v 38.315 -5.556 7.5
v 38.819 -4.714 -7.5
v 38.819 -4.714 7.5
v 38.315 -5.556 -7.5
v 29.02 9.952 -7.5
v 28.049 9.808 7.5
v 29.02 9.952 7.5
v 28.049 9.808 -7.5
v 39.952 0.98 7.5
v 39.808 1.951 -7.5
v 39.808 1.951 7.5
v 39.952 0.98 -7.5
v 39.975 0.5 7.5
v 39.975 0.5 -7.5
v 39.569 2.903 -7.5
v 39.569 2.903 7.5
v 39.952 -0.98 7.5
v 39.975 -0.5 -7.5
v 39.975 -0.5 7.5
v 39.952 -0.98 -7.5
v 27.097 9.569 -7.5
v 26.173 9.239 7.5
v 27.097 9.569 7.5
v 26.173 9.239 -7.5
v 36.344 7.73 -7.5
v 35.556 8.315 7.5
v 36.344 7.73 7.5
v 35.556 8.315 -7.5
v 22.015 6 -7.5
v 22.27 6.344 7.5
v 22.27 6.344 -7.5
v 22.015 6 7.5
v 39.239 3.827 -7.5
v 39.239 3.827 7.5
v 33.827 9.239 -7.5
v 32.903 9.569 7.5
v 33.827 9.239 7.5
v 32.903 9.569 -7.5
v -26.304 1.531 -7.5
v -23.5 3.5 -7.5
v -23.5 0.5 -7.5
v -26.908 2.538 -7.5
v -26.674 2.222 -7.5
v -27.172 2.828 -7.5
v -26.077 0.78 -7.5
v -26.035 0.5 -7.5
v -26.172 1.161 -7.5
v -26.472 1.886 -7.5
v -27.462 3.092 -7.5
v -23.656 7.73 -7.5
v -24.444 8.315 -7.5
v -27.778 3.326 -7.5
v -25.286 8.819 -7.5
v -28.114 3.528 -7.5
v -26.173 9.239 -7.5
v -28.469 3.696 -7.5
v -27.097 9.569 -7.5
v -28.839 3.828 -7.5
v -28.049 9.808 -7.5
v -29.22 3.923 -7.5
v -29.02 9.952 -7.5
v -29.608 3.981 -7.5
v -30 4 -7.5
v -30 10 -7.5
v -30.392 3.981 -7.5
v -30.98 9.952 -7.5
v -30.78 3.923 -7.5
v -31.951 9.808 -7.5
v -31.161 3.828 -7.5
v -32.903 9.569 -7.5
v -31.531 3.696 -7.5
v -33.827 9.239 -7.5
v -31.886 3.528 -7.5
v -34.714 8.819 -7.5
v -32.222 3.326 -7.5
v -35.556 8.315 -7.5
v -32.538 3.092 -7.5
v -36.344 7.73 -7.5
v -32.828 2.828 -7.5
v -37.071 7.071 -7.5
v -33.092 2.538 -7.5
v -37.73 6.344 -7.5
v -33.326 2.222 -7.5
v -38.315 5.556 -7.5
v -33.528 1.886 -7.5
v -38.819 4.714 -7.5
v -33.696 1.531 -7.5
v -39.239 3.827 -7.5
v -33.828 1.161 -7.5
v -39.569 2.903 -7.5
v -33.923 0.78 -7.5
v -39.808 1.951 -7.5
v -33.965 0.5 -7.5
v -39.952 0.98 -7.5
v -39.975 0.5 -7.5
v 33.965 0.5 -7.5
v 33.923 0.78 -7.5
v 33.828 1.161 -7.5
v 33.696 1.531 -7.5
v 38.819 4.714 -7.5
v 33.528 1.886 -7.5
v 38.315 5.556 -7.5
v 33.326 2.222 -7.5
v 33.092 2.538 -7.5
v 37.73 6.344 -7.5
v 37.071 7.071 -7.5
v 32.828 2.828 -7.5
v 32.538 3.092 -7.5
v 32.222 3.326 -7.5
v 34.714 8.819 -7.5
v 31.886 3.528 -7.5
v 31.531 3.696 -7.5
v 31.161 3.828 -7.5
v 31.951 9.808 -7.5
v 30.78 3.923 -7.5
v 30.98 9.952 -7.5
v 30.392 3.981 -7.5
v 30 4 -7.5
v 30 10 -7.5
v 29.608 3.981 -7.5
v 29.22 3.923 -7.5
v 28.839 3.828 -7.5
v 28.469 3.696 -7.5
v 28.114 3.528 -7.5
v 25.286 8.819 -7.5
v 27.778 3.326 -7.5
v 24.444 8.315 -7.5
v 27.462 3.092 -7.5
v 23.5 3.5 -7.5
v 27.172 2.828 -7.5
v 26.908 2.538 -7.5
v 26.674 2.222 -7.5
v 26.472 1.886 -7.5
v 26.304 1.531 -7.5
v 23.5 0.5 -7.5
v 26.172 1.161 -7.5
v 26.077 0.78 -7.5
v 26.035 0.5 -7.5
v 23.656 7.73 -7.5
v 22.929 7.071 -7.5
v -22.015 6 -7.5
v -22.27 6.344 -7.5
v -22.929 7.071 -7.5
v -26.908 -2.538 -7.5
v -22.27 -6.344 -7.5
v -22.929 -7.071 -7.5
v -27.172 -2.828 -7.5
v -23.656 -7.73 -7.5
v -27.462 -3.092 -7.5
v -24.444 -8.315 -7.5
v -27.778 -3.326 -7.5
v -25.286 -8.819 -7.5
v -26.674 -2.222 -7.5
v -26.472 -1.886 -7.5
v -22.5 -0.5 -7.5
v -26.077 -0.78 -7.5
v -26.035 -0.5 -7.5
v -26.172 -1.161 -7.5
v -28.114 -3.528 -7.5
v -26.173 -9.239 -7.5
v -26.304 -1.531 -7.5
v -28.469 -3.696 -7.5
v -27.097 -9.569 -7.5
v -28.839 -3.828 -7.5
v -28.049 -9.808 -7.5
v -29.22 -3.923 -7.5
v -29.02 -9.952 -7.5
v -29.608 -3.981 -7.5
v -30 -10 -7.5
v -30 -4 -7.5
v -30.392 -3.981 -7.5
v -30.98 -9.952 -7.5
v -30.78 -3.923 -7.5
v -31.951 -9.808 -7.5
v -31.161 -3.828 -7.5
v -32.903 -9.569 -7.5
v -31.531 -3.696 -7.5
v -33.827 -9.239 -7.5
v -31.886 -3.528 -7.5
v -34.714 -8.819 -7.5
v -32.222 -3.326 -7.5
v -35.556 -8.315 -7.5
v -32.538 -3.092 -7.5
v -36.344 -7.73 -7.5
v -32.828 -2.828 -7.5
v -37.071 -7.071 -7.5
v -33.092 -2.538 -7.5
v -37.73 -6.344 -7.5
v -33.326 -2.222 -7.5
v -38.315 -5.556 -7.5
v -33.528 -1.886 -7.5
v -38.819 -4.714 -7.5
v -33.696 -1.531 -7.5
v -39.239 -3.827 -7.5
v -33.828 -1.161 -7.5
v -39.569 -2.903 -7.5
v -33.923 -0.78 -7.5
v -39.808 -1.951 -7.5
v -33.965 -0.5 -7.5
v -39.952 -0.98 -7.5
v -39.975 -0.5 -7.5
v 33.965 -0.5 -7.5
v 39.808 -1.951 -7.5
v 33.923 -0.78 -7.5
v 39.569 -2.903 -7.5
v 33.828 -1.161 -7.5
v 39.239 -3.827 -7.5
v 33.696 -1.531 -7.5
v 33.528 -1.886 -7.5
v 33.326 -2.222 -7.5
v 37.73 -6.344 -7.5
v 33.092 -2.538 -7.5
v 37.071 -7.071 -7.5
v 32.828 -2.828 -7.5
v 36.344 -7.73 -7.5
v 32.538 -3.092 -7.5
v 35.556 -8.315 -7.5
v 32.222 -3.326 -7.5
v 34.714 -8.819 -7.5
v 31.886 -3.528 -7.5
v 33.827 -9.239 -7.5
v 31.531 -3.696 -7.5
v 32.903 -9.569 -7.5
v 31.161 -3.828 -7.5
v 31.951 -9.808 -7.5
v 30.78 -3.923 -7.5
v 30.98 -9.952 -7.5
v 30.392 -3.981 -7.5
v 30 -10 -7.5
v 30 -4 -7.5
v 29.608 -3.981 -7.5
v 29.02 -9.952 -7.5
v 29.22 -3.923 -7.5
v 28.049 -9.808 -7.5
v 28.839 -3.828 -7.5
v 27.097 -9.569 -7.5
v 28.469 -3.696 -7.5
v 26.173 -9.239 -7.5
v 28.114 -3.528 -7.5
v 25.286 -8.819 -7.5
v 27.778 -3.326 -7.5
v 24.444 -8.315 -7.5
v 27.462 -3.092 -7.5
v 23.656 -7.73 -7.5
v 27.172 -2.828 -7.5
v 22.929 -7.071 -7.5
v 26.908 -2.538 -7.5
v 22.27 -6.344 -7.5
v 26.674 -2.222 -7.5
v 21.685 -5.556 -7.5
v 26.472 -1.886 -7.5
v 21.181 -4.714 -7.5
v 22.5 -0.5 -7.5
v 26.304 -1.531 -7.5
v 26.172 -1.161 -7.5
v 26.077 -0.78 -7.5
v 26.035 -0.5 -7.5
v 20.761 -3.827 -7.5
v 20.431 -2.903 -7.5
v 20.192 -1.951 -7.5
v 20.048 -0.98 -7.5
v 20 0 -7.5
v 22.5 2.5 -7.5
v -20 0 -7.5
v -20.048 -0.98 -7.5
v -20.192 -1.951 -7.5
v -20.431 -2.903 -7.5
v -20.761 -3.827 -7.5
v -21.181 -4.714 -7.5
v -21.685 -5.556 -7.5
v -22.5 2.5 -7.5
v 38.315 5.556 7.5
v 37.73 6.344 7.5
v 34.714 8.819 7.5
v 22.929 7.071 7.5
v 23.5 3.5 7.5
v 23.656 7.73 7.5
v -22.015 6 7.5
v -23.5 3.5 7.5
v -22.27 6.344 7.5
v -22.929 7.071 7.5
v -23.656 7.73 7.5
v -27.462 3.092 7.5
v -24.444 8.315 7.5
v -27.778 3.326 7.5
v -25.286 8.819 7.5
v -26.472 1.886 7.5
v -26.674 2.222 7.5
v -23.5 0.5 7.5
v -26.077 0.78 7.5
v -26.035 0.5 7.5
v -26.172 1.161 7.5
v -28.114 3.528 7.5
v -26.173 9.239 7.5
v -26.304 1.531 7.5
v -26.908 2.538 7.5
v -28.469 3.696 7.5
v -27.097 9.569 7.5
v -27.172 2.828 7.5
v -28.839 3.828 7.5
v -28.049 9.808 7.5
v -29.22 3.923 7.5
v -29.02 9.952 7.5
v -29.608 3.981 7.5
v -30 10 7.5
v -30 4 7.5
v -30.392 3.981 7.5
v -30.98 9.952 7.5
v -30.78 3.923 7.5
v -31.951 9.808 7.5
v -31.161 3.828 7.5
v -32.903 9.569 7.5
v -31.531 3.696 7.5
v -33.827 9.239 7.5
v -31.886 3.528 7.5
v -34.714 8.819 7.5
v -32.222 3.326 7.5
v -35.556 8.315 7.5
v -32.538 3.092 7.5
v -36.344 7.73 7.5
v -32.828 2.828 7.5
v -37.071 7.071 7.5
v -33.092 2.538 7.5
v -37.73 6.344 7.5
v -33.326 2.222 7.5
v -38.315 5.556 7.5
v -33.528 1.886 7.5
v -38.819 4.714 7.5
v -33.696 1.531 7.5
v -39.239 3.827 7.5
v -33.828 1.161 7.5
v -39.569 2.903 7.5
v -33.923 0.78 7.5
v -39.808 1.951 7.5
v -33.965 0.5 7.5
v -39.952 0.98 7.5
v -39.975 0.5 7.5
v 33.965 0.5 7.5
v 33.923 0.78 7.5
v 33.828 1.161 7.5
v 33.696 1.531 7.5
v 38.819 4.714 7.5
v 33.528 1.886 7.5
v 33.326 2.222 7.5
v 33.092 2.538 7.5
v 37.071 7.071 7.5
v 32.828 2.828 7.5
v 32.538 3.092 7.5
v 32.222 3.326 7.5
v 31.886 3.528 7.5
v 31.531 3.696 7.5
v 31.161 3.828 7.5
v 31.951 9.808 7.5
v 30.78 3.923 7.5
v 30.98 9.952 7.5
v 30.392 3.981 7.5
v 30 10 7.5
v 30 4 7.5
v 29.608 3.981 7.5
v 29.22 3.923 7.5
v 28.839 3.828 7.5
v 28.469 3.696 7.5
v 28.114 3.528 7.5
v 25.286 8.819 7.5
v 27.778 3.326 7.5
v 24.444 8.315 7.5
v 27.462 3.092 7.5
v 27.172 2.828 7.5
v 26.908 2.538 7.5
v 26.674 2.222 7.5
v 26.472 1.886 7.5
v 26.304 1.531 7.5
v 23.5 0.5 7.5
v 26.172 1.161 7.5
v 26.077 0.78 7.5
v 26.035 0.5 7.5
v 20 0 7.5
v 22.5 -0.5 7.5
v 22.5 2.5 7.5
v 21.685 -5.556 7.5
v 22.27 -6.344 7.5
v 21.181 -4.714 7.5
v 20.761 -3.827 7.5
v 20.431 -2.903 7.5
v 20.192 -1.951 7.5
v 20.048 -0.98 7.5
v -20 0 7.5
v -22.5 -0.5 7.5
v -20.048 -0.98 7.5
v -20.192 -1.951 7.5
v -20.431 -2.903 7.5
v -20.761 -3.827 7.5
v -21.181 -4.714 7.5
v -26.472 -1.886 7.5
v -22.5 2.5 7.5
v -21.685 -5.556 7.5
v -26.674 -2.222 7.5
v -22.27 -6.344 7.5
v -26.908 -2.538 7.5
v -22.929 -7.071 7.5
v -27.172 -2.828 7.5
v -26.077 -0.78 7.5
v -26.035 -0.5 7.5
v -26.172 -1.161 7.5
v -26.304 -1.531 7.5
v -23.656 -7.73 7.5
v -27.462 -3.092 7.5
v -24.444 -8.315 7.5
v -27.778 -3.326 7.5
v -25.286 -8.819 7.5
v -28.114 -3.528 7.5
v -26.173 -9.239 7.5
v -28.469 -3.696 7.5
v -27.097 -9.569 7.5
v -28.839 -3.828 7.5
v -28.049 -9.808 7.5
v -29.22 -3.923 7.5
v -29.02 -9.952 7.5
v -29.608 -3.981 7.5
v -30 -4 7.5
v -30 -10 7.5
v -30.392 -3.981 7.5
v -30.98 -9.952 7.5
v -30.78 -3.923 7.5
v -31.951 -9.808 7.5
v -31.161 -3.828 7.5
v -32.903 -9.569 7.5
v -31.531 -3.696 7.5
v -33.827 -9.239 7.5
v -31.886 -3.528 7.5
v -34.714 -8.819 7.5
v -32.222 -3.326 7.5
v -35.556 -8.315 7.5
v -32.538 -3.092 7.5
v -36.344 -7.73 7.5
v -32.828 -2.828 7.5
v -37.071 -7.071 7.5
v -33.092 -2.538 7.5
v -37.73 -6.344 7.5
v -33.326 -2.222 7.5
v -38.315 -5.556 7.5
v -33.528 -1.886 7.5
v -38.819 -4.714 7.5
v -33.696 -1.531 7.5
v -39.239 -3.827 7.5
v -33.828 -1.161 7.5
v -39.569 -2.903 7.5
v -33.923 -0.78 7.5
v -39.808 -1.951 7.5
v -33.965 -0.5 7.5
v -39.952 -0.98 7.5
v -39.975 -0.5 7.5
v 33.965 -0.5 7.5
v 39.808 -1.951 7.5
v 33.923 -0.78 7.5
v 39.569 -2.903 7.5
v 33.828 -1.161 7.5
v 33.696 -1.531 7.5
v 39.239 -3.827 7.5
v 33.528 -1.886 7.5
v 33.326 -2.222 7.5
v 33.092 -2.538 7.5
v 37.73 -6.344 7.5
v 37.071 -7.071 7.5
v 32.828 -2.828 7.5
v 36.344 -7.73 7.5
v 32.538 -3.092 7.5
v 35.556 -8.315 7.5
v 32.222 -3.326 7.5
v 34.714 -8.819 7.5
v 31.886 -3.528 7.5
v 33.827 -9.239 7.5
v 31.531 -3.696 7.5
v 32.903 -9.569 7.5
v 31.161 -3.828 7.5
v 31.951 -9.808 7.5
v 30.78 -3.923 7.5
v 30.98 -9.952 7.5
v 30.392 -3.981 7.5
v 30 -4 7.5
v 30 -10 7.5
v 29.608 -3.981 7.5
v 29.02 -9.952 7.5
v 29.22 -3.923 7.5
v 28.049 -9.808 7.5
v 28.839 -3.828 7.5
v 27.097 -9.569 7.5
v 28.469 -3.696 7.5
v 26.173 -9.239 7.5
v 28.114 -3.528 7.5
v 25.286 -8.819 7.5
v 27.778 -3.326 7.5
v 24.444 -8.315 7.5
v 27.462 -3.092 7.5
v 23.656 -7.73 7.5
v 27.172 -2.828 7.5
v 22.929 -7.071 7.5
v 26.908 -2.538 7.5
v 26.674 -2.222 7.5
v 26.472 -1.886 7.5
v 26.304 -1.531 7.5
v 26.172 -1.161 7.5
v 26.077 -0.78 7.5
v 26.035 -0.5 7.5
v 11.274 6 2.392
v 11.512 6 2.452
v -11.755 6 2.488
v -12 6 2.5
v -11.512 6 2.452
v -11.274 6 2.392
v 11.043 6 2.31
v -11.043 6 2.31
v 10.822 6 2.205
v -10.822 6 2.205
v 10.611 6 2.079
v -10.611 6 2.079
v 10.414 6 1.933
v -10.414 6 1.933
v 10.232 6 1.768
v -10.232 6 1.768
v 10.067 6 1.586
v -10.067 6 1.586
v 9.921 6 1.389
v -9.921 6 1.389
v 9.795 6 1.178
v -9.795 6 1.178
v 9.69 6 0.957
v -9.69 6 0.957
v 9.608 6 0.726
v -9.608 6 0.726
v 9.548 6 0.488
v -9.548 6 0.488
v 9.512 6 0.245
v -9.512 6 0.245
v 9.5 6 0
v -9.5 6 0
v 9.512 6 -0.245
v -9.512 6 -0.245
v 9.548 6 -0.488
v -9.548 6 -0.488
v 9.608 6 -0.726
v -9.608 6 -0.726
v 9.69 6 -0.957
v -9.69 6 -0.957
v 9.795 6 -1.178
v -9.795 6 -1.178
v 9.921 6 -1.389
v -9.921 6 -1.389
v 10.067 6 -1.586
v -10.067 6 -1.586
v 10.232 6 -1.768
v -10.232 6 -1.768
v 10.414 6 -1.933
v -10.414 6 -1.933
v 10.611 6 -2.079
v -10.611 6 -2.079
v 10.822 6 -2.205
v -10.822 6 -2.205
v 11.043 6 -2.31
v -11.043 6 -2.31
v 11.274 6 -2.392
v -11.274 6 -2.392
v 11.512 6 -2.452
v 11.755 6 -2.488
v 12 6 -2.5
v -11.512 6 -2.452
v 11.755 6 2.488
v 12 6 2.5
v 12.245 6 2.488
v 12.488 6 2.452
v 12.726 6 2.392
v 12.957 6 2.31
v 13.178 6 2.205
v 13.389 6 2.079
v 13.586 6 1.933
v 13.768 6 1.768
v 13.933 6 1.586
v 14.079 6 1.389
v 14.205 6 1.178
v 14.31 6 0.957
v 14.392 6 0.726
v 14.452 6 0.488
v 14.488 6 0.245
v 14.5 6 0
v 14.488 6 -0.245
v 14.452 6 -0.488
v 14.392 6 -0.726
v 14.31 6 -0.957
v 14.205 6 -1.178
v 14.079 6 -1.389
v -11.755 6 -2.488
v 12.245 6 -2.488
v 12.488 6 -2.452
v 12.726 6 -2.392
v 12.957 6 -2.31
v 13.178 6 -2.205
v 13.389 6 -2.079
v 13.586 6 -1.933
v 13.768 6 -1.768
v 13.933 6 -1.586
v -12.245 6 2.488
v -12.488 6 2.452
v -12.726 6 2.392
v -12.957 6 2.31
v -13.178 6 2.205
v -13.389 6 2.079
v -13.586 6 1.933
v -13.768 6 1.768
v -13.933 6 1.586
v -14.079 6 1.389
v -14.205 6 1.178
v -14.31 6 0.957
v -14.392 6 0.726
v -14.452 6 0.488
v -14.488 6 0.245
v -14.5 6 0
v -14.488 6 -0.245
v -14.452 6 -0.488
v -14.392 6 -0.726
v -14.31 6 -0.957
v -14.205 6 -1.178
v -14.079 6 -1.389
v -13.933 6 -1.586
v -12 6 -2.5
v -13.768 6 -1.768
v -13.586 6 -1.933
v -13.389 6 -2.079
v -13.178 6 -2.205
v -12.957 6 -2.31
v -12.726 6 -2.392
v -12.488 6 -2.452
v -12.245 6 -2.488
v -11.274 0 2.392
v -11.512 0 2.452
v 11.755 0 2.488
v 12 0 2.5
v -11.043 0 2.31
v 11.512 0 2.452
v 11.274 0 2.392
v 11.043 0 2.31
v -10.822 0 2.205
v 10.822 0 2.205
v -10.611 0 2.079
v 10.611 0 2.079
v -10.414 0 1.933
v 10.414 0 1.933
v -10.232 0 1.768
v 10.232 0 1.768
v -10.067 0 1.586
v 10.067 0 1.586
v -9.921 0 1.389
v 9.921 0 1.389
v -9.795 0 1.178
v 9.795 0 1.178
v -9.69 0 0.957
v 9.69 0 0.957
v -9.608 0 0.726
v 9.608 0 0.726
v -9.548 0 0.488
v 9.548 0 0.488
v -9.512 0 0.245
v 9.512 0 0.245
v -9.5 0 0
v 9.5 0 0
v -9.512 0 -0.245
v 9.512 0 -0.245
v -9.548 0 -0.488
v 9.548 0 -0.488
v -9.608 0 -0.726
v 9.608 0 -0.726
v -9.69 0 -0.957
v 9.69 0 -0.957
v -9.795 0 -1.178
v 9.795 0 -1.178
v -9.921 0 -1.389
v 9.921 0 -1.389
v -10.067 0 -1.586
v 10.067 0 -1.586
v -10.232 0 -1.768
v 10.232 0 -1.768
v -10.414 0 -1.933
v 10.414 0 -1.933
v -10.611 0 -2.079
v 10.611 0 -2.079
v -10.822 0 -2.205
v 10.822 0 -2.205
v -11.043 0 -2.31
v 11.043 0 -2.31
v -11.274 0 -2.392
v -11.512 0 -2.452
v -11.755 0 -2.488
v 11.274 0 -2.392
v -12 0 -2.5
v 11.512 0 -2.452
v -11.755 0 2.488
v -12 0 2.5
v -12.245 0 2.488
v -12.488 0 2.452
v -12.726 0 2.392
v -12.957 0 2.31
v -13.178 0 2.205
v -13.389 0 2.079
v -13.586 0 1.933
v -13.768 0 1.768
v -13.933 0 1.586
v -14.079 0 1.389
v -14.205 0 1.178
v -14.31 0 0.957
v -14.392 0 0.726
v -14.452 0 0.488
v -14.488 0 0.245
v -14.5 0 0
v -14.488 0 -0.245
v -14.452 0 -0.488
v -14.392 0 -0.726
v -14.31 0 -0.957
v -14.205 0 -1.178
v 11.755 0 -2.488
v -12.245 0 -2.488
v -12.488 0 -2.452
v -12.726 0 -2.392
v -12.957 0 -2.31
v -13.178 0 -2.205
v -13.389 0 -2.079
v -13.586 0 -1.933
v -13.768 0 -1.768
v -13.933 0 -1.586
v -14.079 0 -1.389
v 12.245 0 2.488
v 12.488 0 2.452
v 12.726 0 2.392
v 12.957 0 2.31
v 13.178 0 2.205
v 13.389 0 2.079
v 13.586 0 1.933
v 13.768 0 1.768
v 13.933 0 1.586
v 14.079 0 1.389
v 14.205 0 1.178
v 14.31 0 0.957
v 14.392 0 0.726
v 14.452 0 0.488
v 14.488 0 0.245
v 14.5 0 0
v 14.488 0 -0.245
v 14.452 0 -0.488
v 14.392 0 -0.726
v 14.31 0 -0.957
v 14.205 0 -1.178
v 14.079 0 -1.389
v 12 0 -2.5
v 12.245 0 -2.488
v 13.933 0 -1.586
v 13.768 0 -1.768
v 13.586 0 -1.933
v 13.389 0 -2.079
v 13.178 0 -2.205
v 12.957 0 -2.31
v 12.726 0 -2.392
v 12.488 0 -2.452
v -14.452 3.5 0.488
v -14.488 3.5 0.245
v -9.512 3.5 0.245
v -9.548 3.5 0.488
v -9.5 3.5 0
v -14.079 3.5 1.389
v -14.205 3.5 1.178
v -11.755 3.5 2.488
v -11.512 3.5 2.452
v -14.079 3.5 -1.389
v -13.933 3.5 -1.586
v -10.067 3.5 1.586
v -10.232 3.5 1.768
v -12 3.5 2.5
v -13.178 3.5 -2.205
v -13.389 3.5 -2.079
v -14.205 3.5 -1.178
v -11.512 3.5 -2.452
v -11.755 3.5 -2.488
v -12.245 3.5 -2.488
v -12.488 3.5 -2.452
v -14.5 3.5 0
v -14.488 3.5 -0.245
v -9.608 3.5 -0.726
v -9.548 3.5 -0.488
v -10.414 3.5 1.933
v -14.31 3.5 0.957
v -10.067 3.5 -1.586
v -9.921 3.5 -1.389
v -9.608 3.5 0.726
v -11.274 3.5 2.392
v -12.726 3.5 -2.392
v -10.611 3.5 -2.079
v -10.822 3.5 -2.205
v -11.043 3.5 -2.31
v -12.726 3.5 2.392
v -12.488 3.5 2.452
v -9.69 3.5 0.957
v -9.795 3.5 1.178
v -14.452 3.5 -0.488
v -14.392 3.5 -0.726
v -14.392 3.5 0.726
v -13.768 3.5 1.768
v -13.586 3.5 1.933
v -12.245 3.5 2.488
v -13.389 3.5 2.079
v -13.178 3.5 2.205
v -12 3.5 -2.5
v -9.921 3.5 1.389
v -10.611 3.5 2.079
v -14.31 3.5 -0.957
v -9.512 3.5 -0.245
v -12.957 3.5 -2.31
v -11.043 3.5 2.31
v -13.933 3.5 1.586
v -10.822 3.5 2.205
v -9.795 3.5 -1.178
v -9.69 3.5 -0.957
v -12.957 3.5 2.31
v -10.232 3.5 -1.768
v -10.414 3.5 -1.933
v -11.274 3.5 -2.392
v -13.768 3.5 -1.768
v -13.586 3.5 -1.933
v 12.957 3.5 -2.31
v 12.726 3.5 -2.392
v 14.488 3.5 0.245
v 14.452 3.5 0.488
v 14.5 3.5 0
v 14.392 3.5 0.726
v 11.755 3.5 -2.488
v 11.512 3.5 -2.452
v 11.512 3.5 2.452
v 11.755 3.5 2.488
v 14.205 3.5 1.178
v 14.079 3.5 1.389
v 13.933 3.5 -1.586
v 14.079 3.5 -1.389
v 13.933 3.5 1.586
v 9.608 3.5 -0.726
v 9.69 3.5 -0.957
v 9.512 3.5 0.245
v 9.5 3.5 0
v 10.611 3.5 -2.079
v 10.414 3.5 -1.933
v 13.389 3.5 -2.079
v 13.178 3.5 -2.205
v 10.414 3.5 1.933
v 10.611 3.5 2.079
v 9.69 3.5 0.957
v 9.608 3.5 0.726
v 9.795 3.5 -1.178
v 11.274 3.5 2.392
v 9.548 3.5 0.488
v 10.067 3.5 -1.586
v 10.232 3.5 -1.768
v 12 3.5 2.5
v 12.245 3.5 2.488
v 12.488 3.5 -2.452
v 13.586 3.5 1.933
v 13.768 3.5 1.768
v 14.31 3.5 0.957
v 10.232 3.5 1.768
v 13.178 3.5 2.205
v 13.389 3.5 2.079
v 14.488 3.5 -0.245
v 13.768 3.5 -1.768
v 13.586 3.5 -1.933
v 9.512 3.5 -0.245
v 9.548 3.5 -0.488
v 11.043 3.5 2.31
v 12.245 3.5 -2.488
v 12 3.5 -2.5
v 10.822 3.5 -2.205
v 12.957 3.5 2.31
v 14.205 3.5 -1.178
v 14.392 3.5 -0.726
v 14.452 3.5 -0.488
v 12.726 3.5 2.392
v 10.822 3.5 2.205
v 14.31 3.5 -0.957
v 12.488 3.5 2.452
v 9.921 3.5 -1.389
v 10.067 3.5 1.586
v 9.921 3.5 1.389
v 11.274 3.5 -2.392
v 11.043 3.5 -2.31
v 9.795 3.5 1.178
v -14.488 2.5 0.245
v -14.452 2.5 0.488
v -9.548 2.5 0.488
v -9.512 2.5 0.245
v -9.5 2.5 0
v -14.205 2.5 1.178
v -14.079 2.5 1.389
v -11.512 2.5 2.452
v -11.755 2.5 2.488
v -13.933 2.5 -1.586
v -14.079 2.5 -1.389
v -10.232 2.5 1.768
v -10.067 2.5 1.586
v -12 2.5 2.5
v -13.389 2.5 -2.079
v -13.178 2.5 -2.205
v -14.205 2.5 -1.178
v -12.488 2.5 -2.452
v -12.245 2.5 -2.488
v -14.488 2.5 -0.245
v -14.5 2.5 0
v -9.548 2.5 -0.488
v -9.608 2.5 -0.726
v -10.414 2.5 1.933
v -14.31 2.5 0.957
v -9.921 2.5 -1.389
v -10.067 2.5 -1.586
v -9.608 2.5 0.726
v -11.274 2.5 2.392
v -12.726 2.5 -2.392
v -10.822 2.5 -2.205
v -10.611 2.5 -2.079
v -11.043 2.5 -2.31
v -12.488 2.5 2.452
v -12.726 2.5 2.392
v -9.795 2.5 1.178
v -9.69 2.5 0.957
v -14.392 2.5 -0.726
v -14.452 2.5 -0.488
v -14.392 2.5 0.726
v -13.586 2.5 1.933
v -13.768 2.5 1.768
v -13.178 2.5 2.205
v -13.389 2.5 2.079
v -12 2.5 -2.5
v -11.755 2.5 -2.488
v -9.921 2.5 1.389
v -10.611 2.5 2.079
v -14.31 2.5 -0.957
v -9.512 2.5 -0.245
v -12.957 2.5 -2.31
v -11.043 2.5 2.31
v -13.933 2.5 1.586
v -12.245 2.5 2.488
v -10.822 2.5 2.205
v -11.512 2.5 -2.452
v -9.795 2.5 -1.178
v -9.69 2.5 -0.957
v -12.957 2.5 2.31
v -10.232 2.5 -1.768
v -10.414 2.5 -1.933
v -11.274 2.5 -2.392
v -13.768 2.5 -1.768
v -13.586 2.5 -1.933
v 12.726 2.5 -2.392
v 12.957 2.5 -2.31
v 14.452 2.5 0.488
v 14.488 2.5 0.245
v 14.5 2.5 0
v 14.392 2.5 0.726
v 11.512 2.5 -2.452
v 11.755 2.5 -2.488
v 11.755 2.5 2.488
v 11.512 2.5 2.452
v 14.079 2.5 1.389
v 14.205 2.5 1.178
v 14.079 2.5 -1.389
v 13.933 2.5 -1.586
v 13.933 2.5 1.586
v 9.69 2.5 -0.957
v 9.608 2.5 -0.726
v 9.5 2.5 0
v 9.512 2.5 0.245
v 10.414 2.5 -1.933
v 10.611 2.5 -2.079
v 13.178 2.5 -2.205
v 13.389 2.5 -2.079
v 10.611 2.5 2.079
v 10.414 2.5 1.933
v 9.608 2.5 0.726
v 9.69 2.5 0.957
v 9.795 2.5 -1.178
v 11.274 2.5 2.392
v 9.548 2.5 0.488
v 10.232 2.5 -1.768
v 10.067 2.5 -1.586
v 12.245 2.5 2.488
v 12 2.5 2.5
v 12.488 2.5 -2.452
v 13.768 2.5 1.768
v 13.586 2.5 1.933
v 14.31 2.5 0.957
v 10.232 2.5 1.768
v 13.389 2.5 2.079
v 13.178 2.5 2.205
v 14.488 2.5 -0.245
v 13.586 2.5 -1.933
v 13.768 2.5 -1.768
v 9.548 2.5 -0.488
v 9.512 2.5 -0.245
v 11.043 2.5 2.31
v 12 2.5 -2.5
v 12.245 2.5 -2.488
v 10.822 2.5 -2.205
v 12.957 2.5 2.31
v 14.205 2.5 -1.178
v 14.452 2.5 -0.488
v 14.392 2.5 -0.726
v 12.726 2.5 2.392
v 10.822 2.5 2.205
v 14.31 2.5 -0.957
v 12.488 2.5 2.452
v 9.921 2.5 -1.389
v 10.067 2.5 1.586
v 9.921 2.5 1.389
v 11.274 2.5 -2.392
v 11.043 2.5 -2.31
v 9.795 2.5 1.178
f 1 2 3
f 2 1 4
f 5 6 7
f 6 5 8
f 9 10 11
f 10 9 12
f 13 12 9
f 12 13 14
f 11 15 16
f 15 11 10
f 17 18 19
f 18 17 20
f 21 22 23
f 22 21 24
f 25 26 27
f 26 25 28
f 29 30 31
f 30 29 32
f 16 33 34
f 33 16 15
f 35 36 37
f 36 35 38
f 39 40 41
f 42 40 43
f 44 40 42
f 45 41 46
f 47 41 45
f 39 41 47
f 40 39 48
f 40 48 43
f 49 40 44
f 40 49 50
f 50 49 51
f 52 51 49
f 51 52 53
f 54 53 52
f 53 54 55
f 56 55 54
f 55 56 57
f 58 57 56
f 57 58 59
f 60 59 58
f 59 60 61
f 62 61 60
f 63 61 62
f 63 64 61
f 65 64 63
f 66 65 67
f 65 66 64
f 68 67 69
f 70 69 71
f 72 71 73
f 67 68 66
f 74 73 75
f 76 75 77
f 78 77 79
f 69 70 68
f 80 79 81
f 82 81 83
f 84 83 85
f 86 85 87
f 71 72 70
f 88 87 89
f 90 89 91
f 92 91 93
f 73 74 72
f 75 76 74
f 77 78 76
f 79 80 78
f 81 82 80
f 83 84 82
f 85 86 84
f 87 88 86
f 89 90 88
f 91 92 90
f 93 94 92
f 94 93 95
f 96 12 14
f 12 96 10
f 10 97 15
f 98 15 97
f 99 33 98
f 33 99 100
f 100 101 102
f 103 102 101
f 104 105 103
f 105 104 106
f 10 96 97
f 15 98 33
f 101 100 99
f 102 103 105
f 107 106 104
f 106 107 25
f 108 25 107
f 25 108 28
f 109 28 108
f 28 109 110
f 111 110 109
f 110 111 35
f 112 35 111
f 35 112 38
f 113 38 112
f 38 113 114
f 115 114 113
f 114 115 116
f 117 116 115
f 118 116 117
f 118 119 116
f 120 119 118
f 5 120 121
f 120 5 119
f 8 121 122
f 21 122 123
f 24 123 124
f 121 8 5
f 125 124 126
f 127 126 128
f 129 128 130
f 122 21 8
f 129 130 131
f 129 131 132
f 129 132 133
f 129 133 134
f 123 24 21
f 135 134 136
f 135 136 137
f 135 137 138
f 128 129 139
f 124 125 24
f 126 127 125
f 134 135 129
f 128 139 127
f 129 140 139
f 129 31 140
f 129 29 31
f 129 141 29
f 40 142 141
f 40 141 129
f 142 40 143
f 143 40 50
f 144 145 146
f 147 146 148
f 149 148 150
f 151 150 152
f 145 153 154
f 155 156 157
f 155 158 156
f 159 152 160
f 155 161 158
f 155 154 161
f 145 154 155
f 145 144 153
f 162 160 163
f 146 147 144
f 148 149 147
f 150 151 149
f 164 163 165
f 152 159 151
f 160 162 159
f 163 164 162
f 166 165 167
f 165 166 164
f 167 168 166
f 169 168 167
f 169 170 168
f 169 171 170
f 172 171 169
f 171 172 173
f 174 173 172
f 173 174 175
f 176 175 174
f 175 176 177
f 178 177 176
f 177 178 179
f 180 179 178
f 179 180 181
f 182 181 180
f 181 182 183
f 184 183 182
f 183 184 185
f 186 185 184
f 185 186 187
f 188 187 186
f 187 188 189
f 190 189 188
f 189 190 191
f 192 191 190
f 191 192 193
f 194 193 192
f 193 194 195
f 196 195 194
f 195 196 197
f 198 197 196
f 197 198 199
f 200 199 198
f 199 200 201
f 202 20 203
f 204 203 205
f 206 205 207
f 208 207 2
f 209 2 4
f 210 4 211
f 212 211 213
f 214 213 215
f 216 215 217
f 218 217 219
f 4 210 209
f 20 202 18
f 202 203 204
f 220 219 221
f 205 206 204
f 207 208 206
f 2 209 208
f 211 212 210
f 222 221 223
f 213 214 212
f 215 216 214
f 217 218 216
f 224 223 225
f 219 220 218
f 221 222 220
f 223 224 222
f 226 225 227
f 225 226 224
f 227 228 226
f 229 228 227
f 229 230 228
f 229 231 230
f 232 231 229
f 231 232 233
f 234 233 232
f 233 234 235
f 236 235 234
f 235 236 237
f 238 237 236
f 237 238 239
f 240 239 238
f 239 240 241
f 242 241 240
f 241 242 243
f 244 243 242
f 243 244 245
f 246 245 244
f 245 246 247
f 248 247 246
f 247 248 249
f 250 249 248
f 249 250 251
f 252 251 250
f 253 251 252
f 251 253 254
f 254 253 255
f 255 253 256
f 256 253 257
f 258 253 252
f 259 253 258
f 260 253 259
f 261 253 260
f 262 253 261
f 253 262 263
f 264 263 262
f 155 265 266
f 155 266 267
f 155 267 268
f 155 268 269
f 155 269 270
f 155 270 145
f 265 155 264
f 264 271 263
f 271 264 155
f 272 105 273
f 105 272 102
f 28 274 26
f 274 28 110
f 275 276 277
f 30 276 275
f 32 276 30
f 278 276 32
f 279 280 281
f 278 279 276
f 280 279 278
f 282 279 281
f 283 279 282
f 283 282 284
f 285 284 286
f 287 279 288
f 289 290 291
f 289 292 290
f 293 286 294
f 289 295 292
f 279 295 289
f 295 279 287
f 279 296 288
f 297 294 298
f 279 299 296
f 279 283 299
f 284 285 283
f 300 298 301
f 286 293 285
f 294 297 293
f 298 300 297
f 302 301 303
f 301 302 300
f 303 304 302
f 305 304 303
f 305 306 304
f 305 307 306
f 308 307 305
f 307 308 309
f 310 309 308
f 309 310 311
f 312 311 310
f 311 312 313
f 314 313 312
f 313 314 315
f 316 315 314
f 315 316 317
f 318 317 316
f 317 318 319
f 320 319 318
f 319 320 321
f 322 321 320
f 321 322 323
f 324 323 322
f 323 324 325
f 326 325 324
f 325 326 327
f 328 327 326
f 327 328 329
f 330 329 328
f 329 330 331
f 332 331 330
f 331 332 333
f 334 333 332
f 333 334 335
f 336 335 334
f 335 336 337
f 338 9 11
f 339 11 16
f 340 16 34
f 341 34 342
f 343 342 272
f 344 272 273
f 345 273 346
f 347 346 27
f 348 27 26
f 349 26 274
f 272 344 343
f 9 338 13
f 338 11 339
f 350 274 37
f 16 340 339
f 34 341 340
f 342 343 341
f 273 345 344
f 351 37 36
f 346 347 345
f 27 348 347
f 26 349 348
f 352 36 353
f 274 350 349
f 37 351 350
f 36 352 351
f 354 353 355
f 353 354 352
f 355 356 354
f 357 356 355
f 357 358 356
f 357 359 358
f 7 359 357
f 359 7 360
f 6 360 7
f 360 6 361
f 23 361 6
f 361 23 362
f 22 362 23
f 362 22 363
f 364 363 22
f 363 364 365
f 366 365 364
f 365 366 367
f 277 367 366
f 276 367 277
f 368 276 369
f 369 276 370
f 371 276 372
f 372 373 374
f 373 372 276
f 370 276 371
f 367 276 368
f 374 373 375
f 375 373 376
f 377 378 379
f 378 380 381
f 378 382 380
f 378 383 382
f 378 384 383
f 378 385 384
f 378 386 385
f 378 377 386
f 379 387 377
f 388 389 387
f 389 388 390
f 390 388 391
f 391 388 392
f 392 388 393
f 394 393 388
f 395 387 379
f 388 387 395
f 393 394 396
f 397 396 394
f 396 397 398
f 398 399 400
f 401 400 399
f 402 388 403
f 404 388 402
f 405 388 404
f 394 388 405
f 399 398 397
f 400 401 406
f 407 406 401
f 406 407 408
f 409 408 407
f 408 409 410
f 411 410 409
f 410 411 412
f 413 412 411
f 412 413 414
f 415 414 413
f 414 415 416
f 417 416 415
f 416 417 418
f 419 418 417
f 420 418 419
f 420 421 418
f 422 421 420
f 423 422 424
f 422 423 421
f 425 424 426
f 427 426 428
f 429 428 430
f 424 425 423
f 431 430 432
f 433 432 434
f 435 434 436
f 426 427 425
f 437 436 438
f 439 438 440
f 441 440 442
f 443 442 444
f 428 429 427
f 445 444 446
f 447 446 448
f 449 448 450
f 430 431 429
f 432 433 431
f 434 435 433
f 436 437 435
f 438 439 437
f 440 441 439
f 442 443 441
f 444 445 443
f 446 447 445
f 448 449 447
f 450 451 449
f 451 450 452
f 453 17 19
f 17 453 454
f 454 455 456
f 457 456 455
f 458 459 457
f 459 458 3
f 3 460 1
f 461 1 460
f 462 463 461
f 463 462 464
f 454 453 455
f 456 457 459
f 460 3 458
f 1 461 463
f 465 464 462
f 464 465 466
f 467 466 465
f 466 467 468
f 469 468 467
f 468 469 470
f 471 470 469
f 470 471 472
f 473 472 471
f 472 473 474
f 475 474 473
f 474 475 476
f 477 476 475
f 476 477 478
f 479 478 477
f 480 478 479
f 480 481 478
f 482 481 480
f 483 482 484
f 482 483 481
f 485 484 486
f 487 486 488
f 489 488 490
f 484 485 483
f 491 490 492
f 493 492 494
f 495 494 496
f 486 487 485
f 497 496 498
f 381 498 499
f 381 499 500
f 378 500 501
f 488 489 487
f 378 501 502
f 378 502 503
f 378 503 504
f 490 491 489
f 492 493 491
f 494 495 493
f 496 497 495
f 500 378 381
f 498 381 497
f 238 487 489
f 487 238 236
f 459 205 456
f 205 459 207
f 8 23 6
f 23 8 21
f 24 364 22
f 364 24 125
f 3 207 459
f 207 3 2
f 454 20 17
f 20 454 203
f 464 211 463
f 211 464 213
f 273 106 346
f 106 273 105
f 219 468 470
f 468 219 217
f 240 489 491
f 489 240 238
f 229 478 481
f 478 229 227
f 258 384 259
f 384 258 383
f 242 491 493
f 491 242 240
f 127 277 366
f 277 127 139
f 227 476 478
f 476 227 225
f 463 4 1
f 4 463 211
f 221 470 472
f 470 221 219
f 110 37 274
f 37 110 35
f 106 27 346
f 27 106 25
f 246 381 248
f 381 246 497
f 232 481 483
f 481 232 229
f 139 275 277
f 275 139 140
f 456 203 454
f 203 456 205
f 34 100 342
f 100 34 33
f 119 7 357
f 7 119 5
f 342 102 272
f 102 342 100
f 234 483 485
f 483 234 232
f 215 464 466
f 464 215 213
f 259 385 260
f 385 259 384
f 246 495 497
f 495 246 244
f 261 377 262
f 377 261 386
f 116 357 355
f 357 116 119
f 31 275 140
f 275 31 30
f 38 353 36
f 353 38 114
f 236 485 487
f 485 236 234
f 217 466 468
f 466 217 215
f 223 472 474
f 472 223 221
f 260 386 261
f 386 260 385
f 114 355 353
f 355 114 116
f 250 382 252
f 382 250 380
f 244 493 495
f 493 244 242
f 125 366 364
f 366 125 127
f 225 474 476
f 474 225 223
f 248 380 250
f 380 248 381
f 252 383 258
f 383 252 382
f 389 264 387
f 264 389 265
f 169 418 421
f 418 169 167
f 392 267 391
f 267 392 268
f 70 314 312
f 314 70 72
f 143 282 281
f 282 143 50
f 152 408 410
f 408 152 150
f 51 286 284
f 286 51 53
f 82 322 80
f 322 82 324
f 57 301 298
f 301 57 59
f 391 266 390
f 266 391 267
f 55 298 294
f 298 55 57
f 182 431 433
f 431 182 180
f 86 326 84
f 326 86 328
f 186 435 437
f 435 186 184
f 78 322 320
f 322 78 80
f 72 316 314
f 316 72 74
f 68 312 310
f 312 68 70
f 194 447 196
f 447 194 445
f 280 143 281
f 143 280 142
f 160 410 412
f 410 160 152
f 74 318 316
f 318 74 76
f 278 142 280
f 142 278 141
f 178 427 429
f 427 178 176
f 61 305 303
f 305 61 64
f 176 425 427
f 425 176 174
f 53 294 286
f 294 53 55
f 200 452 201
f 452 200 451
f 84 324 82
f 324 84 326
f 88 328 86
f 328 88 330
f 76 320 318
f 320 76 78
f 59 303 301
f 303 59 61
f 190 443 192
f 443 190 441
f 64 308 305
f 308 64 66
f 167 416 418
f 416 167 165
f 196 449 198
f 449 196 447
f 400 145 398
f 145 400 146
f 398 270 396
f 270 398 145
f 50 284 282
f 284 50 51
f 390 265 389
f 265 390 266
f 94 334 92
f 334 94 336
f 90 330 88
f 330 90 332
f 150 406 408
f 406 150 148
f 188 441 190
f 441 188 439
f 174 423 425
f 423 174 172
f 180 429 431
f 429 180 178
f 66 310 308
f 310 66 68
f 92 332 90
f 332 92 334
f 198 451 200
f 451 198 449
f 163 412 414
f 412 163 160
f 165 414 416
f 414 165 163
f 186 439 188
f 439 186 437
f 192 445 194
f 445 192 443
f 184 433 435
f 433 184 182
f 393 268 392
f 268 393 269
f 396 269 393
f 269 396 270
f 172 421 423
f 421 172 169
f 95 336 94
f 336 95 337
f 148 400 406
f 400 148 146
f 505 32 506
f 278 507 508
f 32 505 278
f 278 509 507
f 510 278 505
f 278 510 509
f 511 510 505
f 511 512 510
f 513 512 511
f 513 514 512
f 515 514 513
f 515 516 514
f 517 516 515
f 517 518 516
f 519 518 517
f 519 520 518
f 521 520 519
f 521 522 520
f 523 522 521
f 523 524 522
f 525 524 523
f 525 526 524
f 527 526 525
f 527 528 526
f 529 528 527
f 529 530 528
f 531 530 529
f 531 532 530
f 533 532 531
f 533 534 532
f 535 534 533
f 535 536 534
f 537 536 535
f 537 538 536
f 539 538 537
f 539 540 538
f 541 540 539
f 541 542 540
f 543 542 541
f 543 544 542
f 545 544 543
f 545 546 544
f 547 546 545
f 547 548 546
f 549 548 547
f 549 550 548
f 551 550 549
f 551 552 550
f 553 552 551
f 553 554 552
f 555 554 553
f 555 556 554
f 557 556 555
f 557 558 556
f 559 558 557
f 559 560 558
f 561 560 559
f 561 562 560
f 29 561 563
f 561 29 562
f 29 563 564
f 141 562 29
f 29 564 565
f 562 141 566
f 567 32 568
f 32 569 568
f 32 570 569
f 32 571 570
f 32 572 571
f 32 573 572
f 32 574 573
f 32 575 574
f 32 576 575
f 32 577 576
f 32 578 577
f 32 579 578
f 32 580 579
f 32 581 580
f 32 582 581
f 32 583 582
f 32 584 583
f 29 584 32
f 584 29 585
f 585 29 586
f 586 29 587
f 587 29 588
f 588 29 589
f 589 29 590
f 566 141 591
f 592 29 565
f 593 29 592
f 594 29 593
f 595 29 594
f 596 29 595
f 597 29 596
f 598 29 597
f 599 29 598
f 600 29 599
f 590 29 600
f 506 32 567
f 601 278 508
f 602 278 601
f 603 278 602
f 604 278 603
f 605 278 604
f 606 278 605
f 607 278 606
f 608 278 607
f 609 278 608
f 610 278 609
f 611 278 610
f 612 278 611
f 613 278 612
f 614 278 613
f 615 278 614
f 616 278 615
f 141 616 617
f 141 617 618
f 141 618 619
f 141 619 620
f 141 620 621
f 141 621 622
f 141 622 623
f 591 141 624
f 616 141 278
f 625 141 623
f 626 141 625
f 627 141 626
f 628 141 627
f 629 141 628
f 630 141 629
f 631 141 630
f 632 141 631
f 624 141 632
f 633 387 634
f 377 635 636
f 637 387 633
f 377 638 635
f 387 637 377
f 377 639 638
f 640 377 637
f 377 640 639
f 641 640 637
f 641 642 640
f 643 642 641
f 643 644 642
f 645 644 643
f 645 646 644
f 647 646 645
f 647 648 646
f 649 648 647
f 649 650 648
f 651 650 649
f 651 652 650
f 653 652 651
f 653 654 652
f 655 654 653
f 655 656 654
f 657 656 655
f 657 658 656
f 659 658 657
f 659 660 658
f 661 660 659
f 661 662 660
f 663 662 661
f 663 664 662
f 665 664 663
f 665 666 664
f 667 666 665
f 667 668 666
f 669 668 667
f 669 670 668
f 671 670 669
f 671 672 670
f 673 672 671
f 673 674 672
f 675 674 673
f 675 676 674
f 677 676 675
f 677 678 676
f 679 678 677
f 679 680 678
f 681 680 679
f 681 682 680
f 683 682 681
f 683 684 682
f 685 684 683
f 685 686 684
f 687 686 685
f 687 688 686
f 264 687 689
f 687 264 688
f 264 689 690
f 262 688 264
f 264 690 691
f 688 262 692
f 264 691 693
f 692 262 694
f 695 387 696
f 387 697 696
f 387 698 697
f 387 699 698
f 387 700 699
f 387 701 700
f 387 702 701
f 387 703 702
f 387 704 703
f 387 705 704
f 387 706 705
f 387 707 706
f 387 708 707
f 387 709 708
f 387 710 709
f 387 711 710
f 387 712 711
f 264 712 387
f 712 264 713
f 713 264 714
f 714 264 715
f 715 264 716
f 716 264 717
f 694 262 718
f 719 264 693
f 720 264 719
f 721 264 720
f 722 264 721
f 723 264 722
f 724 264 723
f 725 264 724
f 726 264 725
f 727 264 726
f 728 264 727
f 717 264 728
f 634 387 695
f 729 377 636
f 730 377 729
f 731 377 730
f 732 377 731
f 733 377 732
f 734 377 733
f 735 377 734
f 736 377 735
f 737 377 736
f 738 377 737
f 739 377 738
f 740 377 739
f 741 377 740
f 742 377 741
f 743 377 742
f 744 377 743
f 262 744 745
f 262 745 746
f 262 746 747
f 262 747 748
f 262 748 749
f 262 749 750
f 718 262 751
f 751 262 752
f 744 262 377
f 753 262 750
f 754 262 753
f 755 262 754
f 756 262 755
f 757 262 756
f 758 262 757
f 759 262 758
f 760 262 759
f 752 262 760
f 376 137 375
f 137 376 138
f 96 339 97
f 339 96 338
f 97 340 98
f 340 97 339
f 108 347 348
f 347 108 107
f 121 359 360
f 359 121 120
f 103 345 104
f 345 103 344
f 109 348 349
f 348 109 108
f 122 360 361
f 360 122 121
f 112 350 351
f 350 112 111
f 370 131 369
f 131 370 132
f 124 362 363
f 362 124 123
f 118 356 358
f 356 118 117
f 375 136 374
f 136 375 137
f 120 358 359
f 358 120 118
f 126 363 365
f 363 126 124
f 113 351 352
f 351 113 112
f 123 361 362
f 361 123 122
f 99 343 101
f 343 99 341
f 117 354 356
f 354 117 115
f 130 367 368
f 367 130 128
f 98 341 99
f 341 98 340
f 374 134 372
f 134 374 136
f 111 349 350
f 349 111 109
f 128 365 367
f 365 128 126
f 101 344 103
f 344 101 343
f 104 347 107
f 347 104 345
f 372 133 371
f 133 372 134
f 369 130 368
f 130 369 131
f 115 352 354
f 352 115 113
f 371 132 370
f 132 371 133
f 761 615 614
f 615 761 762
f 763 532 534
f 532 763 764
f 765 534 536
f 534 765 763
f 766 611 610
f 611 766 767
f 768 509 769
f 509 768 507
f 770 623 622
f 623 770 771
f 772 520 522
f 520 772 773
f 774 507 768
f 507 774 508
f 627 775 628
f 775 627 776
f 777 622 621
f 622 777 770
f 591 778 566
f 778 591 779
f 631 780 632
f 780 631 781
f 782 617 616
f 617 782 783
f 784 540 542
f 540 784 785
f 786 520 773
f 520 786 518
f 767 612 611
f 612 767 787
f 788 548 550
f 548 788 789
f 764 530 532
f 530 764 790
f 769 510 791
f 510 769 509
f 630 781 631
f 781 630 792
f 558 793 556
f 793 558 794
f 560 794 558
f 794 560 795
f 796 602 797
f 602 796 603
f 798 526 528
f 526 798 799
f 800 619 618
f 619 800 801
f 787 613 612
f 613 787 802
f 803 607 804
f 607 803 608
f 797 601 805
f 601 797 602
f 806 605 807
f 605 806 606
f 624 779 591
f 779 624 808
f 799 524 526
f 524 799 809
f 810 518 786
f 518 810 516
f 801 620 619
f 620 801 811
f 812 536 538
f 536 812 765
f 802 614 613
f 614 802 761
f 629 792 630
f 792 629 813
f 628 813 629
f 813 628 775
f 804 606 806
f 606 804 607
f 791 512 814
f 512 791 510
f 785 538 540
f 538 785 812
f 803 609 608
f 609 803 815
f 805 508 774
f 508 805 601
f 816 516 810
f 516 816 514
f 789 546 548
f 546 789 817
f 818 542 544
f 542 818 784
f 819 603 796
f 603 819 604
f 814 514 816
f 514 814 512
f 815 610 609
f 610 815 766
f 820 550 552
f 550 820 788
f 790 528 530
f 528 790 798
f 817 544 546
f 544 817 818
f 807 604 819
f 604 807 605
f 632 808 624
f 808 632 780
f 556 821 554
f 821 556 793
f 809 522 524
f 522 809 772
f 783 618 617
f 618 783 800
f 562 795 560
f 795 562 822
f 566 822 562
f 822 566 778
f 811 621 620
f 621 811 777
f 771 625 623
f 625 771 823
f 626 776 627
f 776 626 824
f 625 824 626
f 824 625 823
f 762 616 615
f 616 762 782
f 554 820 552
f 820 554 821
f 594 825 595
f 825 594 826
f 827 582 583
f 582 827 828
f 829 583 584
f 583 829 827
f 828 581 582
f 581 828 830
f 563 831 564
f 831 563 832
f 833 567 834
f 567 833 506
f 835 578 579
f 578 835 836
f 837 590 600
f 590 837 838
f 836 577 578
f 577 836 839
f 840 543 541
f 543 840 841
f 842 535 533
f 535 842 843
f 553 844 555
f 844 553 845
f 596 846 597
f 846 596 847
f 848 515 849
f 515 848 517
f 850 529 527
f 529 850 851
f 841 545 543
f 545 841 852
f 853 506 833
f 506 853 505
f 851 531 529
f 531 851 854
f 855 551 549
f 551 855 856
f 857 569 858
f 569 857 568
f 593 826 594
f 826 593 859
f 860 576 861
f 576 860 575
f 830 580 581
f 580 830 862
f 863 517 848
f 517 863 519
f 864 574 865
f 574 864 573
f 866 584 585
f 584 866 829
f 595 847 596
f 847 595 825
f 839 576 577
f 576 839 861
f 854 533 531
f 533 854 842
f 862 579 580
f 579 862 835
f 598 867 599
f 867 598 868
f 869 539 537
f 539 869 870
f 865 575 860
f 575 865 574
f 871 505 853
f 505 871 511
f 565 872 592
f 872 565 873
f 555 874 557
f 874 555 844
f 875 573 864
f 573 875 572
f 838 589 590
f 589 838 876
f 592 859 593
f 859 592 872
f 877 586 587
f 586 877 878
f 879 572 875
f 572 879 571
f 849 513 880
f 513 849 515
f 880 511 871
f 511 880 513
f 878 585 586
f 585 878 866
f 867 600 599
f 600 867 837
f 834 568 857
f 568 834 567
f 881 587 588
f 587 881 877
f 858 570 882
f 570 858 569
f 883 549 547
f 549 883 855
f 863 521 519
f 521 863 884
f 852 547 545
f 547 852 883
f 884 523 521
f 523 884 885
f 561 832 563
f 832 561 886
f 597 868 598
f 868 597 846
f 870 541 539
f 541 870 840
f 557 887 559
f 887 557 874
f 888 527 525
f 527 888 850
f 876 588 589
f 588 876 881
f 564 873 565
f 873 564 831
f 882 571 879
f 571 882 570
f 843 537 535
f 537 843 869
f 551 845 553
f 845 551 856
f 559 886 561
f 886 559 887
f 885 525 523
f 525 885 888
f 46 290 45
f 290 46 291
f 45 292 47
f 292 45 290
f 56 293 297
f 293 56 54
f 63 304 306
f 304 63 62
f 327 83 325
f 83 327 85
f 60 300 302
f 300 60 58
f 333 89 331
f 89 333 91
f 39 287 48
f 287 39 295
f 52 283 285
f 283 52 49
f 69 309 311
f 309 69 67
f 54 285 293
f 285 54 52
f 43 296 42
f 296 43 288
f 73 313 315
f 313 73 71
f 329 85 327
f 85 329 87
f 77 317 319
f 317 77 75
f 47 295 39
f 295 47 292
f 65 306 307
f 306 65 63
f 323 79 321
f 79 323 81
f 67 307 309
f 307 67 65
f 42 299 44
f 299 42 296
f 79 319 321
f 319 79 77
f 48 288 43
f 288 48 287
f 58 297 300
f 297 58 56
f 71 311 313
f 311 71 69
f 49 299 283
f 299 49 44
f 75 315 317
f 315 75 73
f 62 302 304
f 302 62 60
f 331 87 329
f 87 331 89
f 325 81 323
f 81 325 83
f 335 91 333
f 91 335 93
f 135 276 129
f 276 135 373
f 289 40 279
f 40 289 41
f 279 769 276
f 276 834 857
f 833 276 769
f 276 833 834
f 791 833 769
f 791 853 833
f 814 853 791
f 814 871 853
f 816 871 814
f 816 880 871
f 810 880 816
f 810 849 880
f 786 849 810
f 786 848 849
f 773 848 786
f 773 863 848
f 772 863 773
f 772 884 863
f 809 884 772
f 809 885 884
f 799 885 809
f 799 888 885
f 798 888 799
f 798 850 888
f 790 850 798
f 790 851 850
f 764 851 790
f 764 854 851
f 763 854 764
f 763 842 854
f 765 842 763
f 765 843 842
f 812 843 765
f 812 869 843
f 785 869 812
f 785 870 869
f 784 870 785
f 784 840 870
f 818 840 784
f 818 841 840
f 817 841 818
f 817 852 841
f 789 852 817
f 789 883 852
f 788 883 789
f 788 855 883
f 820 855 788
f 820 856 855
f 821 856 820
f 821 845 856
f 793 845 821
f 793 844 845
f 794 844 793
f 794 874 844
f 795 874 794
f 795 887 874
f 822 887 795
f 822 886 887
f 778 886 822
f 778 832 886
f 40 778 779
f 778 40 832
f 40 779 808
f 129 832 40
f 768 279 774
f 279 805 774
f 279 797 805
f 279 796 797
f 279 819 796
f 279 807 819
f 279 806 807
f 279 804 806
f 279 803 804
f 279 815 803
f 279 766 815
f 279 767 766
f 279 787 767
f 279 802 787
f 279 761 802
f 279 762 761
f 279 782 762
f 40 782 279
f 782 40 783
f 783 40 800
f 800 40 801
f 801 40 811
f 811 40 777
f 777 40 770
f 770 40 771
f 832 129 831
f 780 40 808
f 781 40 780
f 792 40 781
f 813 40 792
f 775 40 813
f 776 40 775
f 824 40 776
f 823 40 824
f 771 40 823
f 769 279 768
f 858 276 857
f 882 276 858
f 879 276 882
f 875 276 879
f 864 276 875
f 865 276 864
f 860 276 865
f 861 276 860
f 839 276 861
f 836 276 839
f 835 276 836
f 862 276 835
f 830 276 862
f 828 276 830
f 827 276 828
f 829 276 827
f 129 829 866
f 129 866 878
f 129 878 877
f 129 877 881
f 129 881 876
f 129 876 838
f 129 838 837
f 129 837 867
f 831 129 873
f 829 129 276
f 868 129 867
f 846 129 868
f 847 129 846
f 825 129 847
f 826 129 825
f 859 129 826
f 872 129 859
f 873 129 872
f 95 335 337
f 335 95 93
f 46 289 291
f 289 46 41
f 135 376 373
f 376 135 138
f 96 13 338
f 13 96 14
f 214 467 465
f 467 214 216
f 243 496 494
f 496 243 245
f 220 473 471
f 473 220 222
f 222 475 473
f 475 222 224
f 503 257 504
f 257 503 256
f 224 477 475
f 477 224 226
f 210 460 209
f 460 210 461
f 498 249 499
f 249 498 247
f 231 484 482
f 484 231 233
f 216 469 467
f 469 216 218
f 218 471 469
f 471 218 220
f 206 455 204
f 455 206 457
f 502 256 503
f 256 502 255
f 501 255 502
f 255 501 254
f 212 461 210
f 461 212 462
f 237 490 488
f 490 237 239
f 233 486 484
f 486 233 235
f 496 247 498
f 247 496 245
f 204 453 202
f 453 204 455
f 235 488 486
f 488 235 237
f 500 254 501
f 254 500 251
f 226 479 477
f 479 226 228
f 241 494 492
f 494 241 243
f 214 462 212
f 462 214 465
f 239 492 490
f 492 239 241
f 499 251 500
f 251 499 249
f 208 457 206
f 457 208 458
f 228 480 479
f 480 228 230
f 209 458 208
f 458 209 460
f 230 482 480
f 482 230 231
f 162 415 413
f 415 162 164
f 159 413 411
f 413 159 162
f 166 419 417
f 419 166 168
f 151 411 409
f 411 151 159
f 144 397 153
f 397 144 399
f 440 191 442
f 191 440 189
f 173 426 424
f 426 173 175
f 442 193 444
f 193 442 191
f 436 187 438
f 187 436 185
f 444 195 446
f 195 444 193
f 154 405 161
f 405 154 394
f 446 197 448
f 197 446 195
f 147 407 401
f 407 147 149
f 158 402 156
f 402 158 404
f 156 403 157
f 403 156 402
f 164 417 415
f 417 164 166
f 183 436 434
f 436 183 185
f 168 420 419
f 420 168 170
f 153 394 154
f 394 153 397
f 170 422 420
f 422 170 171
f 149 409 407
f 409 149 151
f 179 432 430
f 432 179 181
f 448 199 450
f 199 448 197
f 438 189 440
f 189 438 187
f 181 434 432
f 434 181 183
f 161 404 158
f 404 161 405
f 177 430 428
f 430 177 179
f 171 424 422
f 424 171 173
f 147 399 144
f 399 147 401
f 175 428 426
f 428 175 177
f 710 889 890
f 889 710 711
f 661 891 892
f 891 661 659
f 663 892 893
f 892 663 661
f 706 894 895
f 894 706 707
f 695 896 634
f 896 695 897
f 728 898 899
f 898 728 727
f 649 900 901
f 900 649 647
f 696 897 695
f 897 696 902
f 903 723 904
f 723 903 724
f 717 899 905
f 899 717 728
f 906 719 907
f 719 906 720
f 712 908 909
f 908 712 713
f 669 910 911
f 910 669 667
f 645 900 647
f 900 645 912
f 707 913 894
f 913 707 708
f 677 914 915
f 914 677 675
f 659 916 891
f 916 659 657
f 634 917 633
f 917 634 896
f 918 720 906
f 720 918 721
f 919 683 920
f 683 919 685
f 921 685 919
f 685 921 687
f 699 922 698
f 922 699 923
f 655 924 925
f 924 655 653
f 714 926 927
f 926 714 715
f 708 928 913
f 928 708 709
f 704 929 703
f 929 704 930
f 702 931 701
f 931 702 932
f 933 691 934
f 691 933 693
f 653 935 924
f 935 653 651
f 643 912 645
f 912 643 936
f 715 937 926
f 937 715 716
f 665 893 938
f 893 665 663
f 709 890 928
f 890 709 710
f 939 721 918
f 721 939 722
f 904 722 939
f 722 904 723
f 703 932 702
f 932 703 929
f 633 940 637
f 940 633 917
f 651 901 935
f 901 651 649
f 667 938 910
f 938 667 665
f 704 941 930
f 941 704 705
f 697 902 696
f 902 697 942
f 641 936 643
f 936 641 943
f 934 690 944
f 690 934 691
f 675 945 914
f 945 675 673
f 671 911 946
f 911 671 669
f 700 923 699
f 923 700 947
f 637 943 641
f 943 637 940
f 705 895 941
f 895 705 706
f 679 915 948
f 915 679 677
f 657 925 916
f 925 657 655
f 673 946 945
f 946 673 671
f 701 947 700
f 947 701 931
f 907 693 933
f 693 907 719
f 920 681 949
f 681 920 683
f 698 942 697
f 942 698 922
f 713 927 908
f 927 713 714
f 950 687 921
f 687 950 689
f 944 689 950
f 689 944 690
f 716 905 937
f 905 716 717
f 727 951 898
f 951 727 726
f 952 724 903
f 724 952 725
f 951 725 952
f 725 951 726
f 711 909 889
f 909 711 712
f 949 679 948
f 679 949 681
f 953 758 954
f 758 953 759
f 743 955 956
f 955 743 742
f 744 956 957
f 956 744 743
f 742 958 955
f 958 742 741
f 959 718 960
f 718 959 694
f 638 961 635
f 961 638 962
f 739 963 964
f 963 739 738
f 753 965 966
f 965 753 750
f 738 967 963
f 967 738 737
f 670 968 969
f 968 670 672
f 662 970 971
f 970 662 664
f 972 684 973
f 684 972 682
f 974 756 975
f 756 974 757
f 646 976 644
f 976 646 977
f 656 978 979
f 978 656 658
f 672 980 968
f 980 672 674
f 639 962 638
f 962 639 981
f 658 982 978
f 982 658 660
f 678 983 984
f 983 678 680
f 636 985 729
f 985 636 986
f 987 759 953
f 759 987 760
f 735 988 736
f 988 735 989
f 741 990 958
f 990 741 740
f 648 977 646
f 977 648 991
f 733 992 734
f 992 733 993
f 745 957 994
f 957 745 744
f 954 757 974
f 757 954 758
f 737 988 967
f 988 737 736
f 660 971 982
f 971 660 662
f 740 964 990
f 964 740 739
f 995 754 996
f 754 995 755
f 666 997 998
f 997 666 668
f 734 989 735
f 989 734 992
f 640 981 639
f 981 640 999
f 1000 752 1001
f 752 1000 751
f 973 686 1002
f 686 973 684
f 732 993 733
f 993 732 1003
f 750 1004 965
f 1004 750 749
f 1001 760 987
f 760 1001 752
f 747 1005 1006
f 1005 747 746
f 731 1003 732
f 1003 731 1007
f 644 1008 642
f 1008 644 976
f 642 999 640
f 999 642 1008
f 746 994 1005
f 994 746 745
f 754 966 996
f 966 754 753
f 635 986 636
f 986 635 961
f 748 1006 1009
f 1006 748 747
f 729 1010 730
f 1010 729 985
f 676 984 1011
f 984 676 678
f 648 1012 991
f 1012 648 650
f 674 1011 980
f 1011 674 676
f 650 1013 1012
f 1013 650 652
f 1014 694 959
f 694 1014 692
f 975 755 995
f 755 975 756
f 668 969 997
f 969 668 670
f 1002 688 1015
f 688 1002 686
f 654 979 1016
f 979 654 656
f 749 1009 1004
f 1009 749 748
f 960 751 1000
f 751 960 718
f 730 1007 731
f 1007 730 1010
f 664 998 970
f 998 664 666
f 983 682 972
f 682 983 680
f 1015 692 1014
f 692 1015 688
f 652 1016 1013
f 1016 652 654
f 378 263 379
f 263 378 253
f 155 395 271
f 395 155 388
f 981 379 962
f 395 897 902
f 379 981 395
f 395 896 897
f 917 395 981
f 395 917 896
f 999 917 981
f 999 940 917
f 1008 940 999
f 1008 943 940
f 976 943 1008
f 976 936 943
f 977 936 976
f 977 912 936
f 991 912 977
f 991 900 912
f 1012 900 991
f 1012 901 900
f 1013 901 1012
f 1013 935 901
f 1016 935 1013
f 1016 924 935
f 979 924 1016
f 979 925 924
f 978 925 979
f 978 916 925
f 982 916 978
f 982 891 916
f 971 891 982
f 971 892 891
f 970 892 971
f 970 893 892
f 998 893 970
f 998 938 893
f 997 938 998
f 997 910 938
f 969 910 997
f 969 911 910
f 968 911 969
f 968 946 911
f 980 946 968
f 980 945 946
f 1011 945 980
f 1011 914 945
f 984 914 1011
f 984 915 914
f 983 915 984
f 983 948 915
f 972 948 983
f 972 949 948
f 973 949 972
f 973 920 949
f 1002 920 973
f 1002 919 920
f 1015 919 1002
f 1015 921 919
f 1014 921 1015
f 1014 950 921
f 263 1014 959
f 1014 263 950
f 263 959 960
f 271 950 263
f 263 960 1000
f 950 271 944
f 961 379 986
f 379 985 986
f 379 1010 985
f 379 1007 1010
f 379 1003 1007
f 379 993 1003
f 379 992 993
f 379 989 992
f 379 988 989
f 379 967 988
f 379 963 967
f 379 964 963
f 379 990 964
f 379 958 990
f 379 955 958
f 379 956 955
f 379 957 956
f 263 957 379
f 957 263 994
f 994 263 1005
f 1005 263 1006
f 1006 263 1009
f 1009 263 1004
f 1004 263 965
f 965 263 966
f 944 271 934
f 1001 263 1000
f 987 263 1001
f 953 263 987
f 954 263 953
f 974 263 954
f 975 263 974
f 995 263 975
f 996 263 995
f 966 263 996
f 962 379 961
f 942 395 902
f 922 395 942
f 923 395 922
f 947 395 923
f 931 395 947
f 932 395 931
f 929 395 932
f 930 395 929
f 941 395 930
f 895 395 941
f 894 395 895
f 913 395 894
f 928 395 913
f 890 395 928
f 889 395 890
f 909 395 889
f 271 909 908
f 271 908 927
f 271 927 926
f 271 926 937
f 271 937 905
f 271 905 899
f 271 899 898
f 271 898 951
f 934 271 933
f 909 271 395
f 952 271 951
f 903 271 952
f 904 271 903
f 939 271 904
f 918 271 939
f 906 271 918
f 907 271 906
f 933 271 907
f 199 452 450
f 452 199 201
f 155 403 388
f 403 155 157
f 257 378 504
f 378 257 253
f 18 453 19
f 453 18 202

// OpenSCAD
part = "all"; // [bigger,smaller,all]
rod_diameter=8;
rods_distance=60;
offset=3;
mount_hole=5;
mount_hole_distance=24;
part_width=15;
part_thickness=2.5;
air_gap=1;
$fn=64;
module bigger(){
     difference(){
    union()
         {
             translate([rods_distance/2,0,0])cylinder(d=rod_diameter+4*part_thickness+2*air_gap, h=part_width, center=true);
             translate([-rods_distance/2,0,0])cylinder(d=rod_diameter+4*part_thickness+2*air_gap, h=part_width, center=true);
             translate([0,offset,0])cube([rods_distance-rod_diameter,2*part_thickness+air_gap,part_width],center=true);
             translate([rods_distance/2-rod_diameter/2-part_thickness-air_gap/2,(offset-part_thickness-air_gap/2)/2,0])cube([2*part_thickness+air_gap,offset-part_thickness-air_gap/2,part_width],center=true);
             translate([-rods_distance/2+rod_diameter/2+part_thickness+air_gap/2,(offset-part_thickness-air_gap/2)/2,0])cube([2*part_thickness+air_gap,offset-part_thickness-air_gap/2,part_width],center=true);
             }
             translate([rods_distance/2,0,0])cylinder(d=rod_diameter, h=part_width+2, center=true);
    translate([-mount_hole_distance/2,offset,0])rotate([90,0,0])cylinder(d=mount_hole, h=2*part_thickness+air_gap+2, center=true);         
             translate([mount_hole_distance/2,offset,0])rotate([90,0,0])cylinder(d=mount_hole, h=2*part_thickness+air_gap+2, center=true);
             translate([-rods_distance/2,0,0])cylinder(d=rod_diameter, h=part_width+2, center=true);
    cube([rods_distance-rod_diameter-2*part_thickness,2*offset+air_gap,part_width+2],center=true);
    translate([0,air_gap/2-(rod_diameter+4*part_thickness+2*air_gap)/2,0])cube([rods_distance+rod_diameter+4*part_thickness+2*air_gap+1,rod_diameter+4*part_thickness+2*air_gap,part_width+2],center=true);         
     }
}
module smaller(){
    intersection(){ 
    difference(){
    union()
         {
             translate([rods_distance/2,0,0])cylinder(d=rod_diameter+4*part_thickness+2*air_gap, h=part_width, center=true);
             translate([-rods_distance/2,0,0])cylinder(d=rod_diameter+4*part_thickness+2*air_gap, h=part_width, center=true);
             translate([0,offset,0])cube([rods_distance-rod_diameter,2*part_thickness+air_gap,part_width],center=true);
             translate([rods_distance/2-rod_diameter/2-part_thickness-air_gap/2,(offset-part_thickness-air_gap/2)/2,0])cube([2*part_thickness+air_gap,offset-part_thickness-air_gap/2,part_width],center=true);
             translate([-rods_distance/2+rod_diameter/2+part_thickness+air_gap/2,(offset-part_thickness-air_gap/2)/2,0])cube([2*part_thickness+air_gap,offset-part_thickness-air_gap/2,part_width],center=true);
             }
             translate([rods_distance/2,0,0])cylinder(d=rod_diameter, h=part_width+2, center=true);
             translate([-rods_distance/2,0,0])cylinder(d=rod_diameter, h=part_width+2, center=true);
             translate([-mount_hole_distance/2,offset,0])rotate([90,0,0])cylinder(d=mount_hole, h=2*part_thickness+air_gap+2, center=true);         
             translate([mount_hole_distance/2,offset,0])rotate([90,0,0])cylinder(d=mount_hole, h=2*part_thickness+air_gap+2, center=true);
     }
     union(){
     cube([rods_distance-rod_diameter-2*part_thickness-2*air_gap,2*offset-air_gap,part_width+2],center=true);
    translate([0,-air_gap/2-(rod_diameter+4*part_thickness+2*air_gap)/2,0])cube([rods_distance+rod_diameter+4*part_thickness+2*air_gap+1,rod_diameter+4*part_thickness+2*air_gap,part_width+2],center=true);
     }
 }
}
if (part=="bigger") {
    bigger();
}
if (part=="smaller") {
    smaller();
}
if (part=="all")
{
    bigger();
    smaller();
    }
